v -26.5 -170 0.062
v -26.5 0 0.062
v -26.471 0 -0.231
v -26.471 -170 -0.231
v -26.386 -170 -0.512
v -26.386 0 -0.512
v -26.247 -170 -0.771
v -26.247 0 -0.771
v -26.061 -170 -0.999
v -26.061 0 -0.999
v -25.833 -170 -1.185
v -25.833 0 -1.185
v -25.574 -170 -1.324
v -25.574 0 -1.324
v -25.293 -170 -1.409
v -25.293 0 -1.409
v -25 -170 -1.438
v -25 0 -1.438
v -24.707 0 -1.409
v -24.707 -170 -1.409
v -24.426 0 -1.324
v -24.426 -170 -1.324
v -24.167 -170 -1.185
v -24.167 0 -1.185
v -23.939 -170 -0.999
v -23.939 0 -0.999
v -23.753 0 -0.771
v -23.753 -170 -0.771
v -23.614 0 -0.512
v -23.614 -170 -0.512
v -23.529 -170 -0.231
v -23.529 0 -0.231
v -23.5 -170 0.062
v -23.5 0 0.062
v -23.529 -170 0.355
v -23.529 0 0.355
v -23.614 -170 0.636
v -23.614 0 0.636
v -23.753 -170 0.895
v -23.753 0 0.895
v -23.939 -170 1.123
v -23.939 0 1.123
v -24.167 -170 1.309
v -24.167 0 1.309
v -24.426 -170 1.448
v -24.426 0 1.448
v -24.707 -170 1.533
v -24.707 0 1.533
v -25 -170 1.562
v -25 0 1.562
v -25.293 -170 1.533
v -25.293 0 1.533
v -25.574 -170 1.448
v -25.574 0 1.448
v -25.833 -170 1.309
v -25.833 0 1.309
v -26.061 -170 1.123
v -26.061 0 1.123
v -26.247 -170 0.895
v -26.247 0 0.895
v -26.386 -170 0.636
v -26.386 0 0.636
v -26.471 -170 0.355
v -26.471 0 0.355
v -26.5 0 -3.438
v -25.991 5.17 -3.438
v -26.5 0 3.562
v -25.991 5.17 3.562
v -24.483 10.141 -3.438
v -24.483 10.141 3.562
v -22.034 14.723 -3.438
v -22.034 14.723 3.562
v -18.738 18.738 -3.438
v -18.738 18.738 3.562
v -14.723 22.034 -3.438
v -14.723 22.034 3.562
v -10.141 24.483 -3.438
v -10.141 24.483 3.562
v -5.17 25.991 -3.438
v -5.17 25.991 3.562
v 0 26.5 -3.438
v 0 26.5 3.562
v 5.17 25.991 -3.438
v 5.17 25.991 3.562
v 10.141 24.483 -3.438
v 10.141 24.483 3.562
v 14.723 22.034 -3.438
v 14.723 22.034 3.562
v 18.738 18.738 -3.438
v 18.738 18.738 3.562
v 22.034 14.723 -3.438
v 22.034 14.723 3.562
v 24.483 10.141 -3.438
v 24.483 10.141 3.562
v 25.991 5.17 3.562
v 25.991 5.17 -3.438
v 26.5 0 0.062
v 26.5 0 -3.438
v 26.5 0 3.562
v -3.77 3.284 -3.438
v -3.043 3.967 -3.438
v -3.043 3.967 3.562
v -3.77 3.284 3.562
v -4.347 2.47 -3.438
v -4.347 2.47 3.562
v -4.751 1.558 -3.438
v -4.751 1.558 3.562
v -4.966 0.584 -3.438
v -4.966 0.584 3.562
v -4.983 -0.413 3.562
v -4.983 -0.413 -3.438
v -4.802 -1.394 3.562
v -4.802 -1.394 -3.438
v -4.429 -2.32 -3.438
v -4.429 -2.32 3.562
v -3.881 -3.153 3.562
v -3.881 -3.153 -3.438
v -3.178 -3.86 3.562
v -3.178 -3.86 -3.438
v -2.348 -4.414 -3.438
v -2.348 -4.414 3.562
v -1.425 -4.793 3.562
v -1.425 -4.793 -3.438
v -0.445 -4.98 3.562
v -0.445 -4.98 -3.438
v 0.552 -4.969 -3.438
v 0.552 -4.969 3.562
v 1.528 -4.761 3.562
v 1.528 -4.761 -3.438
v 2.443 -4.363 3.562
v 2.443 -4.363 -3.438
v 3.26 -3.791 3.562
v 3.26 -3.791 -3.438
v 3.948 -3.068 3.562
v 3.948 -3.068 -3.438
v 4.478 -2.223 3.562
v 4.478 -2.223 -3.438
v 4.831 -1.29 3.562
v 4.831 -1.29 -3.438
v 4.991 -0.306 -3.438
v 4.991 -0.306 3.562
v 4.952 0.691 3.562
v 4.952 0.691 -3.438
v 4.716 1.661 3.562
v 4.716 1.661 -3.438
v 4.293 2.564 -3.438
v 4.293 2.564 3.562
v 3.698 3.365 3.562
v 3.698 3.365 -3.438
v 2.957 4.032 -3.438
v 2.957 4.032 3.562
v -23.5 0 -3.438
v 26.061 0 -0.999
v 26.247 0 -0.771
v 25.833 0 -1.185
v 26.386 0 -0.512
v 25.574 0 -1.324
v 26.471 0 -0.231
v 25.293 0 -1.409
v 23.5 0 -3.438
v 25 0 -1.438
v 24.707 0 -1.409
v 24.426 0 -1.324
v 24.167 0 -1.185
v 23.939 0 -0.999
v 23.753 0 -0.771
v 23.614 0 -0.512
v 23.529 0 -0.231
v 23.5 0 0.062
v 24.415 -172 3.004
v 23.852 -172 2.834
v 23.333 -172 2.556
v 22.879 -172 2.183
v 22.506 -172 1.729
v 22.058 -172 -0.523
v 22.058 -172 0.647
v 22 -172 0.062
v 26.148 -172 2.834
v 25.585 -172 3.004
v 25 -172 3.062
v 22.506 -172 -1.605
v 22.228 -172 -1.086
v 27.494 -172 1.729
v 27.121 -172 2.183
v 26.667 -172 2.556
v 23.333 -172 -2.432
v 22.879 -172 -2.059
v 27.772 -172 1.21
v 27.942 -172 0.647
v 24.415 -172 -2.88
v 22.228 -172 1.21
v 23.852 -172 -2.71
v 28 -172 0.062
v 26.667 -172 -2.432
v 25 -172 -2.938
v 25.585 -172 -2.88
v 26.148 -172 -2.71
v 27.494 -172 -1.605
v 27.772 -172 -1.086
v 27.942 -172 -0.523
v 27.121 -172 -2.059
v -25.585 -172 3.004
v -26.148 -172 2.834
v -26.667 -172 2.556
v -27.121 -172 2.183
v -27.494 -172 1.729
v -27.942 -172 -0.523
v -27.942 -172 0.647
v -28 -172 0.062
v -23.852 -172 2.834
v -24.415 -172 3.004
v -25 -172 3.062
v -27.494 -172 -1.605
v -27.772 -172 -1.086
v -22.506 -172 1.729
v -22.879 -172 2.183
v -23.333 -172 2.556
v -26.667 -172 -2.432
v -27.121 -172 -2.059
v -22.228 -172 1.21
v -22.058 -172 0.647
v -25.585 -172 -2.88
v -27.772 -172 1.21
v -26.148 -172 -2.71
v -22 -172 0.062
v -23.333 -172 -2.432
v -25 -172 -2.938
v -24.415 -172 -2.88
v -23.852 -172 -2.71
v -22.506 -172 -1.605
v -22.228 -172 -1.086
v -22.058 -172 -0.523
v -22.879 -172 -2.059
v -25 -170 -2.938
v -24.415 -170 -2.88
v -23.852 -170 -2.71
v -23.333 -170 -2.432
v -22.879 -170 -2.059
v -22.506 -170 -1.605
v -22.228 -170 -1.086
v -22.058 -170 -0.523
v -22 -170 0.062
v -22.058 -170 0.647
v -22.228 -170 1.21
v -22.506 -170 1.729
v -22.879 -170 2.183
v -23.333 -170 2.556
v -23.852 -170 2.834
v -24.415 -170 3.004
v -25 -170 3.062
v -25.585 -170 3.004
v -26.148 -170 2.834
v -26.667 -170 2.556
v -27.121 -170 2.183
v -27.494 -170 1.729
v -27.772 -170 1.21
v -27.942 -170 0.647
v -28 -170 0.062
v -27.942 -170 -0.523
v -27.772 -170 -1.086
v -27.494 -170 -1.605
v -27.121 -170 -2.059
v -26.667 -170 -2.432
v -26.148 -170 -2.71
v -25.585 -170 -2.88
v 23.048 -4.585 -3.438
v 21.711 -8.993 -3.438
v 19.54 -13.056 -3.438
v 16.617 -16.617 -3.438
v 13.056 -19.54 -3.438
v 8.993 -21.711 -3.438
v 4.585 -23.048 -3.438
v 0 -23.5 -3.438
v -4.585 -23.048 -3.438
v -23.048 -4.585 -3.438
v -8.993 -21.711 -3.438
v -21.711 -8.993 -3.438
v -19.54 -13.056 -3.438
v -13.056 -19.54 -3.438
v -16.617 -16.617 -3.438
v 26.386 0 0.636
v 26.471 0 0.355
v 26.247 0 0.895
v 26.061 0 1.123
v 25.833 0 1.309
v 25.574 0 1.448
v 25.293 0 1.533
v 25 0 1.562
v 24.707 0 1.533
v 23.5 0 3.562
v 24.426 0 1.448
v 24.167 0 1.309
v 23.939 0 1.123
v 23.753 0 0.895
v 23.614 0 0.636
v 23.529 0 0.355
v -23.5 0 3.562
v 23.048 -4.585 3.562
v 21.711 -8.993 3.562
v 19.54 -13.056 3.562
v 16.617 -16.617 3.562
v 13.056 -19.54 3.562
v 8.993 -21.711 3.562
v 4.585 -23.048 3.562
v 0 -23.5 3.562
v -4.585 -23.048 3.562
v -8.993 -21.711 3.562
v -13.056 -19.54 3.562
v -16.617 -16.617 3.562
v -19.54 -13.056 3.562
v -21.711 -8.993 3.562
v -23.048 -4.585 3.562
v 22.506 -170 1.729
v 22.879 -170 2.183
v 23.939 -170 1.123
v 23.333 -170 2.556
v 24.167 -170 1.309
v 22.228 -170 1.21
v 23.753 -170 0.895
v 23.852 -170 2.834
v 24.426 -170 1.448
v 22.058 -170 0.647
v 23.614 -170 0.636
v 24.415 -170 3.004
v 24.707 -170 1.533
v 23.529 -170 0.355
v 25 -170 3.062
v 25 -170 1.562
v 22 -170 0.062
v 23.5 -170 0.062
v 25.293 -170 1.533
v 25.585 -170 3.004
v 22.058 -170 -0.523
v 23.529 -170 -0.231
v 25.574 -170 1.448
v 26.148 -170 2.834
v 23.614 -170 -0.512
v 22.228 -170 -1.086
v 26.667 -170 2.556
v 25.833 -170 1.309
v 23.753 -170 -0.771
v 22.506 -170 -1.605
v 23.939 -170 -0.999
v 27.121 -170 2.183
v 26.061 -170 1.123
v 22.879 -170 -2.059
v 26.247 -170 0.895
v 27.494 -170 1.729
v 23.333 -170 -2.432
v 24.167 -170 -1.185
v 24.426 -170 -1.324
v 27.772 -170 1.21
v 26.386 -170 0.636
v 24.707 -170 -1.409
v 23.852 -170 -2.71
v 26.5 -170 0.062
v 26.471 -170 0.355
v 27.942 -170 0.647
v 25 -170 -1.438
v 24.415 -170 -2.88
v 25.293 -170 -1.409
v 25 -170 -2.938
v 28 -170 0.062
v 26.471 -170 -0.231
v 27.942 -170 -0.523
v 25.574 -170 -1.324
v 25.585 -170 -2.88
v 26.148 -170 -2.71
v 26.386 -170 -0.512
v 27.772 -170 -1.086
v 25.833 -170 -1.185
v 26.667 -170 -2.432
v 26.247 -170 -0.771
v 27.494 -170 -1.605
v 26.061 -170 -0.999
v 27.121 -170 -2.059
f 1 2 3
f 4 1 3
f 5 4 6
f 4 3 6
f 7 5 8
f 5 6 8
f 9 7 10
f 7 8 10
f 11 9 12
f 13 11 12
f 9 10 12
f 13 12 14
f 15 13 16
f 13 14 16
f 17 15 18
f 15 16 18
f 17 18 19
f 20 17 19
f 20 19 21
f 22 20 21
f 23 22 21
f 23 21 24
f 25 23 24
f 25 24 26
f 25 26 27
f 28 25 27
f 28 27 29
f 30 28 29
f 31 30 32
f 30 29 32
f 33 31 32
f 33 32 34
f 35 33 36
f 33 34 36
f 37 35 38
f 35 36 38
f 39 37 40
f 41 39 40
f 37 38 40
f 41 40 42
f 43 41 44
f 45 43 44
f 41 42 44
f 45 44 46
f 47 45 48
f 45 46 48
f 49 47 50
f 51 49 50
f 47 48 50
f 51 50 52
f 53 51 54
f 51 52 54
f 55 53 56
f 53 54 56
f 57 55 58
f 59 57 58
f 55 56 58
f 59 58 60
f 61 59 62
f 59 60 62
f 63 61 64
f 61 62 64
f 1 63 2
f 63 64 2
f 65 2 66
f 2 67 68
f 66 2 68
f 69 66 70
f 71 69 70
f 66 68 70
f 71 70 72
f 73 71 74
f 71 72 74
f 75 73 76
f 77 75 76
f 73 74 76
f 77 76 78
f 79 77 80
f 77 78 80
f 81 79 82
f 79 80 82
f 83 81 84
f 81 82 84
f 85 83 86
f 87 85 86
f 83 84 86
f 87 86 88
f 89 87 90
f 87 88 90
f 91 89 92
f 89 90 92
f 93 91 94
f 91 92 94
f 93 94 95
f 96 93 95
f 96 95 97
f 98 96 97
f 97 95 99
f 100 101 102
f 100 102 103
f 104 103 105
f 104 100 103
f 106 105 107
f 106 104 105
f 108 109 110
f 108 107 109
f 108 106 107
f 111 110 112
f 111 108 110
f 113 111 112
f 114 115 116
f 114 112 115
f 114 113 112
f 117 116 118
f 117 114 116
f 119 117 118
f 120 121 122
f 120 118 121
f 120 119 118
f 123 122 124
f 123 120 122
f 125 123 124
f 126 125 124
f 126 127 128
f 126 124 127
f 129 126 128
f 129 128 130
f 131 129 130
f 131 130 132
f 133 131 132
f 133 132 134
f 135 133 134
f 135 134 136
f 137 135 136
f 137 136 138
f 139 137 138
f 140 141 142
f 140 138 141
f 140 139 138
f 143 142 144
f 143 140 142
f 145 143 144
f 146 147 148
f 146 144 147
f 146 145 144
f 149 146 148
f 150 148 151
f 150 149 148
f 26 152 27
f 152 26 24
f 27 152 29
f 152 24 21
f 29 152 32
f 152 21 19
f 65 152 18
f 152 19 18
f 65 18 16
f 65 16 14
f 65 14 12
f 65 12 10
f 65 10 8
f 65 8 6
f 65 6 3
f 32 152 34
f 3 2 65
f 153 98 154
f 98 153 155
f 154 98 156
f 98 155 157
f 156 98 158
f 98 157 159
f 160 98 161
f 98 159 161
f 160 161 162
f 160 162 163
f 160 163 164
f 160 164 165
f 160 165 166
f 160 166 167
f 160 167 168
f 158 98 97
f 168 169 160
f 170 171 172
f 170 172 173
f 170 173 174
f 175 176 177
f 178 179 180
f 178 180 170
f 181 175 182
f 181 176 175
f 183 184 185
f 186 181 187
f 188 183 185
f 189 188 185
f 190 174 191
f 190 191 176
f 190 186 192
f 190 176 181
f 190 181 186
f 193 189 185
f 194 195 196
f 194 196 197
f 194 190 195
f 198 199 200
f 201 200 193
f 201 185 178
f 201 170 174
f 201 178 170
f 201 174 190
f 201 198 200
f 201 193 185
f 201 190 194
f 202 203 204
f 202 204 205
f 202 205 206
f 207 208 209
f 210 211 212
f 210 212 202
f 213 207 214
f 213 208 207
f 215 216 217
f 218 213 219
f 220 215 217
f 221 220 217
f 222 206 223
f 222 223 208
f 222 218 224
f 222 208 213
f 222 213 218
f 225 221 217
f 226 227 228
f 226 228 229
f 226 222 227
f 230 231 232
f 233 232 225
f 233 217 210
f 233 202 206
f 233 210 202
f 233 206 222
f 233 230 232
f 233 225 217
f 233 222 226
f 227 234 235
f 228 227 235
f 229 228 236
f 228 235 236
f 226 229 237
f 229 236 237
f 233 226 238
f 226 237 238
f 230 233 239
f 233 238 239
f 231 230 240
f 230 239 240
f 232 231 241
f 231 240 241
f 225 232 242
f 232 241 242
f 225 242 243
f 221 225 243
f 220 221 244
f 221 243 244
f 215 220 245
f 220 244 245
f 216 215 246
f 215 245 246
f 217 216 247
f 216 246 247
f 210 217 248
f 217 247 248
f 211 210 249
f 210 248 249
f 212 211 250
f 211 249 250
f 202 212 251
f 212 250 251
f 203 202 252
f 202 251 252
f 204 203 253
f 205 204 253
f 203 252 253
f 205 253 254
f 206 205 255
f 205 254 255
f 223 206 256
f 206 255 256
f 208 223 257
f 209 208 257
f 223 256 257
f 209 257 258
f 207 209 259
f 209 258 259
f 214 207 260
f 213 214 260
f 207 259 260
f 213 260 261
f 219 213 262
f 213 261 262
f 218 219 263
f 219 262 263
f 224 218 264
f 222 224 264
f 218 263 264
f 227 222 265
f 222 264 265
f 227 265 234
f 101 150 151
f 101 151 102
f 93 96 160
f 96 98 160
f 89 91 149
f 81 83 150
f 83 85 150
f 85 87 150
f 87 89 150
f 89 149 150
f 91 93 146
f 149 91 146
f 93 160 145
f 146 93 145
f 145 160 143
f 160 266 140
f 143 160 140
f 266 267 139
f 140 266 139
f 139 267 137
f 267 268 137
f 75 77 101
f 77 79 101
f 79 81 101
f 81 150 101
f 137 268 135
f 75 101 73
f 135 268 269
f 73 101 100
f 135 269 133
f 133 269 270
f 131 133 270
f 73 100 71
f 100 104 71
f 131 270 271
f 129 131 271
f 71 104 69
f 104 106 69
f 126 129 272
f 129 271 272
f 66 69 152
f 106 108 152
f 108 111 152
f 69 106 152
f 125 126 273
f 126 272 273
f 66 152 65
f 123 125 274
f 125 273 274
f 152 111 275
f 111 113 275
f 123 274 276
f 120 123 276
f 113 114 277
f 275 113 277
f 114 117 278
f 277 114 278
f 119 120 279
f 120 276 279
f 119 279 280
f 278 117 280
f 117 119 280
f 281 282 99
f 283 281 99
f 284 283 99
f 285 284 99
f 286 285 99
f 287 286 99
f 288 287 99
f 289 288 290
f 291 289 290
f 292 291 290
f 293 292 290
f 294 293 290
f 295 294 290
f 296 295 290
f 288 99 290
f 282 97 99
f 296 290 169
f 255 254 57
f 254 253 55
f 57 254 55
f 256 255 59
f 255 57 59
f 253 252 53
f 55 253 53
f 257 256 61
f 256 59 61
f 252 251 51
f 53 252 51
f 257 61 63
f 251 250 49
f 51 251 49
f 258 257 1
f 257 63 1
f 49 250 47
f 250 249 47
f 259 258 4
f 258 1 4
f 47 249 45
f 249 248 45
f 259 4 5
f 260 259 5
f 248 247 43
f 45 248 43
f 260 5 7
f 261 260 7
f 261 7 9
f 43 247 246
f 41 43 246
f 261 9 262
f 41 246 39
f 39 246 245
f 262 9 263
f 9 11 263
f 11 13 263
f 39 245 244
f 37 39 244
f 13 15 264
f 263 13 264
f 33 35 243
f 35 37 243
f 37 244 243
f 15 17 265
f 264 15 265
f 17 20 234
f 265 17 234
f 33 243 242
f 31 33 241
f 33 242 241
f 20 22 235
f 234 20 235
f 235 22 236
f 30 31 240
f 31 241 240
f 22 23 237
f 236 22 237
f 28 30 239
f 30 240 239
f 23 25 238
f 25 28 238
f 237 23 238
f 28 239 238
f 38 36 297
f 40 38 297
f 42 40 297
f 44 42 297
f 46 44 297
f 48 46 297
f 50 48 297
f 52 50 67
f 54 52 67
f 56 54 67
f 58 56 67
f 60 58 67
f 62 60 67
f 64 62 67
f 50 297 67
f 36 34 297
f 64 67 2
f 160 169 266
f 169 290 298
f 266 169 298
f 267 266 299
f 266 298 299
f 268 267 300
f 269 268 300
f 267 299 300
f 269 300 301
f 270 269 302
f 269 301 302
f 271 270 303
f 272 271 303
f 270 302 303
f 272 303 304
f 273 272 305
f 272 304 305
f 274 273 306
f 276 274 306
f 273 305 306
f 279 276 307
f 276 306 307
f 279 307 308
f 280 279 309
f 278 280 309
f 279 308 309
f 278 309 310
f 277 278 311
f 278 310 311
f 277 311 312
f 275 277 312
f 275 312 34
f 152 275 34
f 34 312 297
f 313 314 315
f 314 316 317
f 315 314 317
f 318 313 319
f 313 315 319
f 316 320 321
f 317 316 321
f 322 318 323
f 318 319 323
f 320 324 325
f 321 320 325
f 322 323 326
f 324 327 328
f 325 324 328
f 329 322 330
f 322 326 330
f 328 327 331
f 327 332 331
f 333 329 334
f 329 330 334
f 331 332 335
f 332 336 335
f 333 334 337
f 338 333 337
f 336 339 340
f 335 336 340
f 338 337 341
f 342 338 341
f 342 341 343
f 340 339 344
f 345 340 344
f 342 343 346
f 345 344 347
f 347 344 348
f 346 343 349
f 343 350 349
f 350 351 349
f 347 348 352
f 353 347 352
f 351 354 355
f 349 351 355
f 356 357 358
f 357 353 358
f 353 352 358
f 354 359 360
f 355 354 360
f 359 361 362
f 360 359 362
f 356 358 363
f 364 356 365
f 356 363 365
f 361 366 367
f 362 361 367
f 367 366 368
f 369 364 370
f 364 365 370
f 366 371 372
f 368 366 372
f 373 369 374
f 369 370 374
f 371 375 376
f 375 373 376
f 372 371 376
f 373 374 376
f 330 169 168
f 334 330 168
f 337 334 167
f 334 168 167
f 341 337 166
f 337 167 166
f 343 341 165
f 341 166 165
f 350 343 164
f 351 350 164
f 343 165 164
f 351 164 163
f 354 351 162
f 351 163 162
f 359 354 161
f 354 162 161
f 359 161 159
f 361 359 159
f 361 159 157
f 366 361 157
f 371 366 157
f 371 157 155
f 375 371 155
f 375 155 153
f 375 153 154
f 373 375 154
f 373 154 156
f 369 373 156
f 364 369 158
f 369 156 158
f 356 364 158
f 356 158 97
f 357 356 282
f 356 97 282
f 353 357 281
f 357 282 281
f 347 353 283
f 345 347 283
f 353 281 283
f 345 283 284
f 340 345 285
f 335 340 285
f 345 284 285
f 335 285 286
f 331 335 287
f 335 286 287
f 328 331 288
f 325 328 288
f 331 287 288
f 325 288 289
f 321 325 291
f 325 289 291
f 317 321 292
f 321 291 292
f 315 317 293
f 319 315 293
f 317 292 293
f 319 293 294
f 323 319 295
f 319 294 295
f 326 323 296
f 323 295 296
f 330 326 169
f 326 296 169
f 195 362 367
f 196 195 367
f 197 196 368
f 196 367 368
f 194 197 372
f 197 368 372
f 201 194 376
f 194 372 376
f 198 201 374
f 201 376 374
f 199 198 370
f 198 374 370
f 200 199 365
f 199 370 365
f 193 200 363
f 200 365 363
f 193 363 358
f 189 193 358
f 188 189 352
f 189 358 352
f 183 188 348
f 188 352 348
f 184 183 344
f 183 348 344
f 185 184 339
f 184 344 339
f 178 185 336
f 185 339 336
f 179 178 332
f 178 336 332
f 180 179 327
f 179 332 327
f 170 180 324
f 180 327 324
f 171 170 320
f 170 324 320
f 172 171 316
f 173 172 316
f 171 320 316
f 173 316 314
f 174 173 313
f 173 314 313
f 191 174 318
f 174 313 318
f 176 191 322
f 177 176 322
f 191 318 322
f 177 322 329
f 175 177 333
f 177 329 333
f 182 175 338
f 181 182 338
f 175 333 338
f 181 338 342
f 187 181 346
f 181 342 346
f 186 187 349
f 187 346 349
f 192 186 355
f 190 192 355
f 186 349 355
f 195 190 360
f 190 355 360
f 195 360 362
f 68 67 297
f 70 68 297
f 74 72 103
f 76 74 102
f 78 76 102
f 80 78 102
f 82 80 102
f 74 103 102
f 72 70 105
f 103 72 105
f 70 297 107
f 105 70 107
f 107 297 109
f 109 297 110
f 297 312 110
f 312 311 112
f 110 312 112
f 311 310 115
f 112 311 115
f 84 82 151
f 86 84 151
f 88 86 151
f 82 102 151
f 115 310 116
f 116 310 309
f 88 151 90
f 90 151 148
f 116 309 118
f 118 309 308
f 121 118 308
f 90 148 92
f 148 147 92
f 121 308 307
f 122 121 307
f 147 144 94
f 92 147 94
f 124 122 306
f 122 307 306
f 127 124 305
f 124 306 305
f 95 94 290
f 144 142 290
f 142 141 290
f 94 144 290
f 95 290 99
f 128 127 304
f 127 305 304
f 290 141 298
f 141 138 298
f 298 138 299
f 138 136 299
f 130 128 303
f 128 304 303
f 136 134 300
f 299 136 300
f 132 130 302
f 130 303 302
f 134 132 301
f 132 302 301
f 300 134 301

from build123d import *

# Parameters (mm, degrees)
CUT_EXTRUDE1_DEPTH  = 9
CUT_EXTRUDE2_START  = -7
CUT_EXTRUDE2_DEPTH  = 7
SKETCH6_R           = 1.5
BOSS_EXTRUDE1_DEPTH = 170
SKETCH7_R           = 3
BOSS_EXTRUDE2_DEPTH = 2


with BuildPart() as part:
    # Sketch2 → Revolve1 (revolve)
    with BuildSketch(Plane(origin=(0, 0, 0), x_dir=(0, 0, -1), z_dir=(1, 0, 0)), mode=Mode.PRIVATE) as revolve1_sk:
        Polygon((-3.561959221, 0), (3.438040779, 0), (3.438040779, 26.5), (1.438040779, 26.5), (-1.561959221, 26.5), (-3.561959221, 26.5), align=None)
    revolve(revolve1_sk.sketch.rotate(Axis((0, 0, 3.561959221), (0, 0, -1)), 90), axis=Axis((0, 0, 3.561959221), (0, 0, -1)))

    # Sketch3 → Cut-Extrude1 (cut)
    with BuildSketch(Plane(origin=(0, 0, -3.438040779), x_dir=(-1, 0, 0), z_dir=(0, 0, -1))):
        with BuildLine():
            Line((-2.95661762, 4.03217215), (3.043032331, 3.967361117))
            ThreePointArc((3.043032331, 3.967361117), (-0.054009195, -4.999708292), (-2.95661762, 4.03217215))
        make_face()
    extrude(amount=-CUT_EXTRUDE1_DEPTH, mode=Mode.SUBTRACT)

    # Sketch5 → Cut-Extrude2 (cut)
    with BuildSketch(Plane(origin=(0, 0, -3.438040779), x_dir=(-1, 0, 0), z_dir=(0, 0, -1)).offset(CUT_EXTRUDE2_START)):
        with BuildLine():
            Line((-26.5, 0), (-23.5, 0))
            ThreePointArc((-23.5, 0), (0, -23.5), (23.5, 0))
            Line((23.5, 0), (26.5, 0))
            ThreePointArc((26.5, 0), (0, -26.5), (-26.5, 0))
        make_face()
    extrude(amount=CUT_EXTRUDE2_DEPTH, mode=Mode.SUBTRACT)

    # Sketch6 → Boss-Extrude1 (add)
    with BuildSketch(Plane.XZ):
        with Locations(Location((25, 0.061959221, 0), (0, 0, 180))):
            Circle(SKETCH6_R)
        with Locations(Location((-25, 0.061959221, 0), (0, 0, 180))):
            Circle(SKETCH6_R)
    extrude(amount=BOSS_EXTRUDE1_DEPTH)

    # Sketch7 → Boss-Extrude2 (add)
    with BuildSketch(Plane.XZ.offset(170)):
        with Locations(Location((25, 0.061959221, 0), (0, 0, 270))):
            Circle(SKETCH7_R)
        with Locations(Location((-25, 0.061959221, 0), (0, 0, 270))):
            Circle(SKETCH7_R)
    extrude(amount=BOSS_EXTRUDE2_DEPTH)


solid = part.part
